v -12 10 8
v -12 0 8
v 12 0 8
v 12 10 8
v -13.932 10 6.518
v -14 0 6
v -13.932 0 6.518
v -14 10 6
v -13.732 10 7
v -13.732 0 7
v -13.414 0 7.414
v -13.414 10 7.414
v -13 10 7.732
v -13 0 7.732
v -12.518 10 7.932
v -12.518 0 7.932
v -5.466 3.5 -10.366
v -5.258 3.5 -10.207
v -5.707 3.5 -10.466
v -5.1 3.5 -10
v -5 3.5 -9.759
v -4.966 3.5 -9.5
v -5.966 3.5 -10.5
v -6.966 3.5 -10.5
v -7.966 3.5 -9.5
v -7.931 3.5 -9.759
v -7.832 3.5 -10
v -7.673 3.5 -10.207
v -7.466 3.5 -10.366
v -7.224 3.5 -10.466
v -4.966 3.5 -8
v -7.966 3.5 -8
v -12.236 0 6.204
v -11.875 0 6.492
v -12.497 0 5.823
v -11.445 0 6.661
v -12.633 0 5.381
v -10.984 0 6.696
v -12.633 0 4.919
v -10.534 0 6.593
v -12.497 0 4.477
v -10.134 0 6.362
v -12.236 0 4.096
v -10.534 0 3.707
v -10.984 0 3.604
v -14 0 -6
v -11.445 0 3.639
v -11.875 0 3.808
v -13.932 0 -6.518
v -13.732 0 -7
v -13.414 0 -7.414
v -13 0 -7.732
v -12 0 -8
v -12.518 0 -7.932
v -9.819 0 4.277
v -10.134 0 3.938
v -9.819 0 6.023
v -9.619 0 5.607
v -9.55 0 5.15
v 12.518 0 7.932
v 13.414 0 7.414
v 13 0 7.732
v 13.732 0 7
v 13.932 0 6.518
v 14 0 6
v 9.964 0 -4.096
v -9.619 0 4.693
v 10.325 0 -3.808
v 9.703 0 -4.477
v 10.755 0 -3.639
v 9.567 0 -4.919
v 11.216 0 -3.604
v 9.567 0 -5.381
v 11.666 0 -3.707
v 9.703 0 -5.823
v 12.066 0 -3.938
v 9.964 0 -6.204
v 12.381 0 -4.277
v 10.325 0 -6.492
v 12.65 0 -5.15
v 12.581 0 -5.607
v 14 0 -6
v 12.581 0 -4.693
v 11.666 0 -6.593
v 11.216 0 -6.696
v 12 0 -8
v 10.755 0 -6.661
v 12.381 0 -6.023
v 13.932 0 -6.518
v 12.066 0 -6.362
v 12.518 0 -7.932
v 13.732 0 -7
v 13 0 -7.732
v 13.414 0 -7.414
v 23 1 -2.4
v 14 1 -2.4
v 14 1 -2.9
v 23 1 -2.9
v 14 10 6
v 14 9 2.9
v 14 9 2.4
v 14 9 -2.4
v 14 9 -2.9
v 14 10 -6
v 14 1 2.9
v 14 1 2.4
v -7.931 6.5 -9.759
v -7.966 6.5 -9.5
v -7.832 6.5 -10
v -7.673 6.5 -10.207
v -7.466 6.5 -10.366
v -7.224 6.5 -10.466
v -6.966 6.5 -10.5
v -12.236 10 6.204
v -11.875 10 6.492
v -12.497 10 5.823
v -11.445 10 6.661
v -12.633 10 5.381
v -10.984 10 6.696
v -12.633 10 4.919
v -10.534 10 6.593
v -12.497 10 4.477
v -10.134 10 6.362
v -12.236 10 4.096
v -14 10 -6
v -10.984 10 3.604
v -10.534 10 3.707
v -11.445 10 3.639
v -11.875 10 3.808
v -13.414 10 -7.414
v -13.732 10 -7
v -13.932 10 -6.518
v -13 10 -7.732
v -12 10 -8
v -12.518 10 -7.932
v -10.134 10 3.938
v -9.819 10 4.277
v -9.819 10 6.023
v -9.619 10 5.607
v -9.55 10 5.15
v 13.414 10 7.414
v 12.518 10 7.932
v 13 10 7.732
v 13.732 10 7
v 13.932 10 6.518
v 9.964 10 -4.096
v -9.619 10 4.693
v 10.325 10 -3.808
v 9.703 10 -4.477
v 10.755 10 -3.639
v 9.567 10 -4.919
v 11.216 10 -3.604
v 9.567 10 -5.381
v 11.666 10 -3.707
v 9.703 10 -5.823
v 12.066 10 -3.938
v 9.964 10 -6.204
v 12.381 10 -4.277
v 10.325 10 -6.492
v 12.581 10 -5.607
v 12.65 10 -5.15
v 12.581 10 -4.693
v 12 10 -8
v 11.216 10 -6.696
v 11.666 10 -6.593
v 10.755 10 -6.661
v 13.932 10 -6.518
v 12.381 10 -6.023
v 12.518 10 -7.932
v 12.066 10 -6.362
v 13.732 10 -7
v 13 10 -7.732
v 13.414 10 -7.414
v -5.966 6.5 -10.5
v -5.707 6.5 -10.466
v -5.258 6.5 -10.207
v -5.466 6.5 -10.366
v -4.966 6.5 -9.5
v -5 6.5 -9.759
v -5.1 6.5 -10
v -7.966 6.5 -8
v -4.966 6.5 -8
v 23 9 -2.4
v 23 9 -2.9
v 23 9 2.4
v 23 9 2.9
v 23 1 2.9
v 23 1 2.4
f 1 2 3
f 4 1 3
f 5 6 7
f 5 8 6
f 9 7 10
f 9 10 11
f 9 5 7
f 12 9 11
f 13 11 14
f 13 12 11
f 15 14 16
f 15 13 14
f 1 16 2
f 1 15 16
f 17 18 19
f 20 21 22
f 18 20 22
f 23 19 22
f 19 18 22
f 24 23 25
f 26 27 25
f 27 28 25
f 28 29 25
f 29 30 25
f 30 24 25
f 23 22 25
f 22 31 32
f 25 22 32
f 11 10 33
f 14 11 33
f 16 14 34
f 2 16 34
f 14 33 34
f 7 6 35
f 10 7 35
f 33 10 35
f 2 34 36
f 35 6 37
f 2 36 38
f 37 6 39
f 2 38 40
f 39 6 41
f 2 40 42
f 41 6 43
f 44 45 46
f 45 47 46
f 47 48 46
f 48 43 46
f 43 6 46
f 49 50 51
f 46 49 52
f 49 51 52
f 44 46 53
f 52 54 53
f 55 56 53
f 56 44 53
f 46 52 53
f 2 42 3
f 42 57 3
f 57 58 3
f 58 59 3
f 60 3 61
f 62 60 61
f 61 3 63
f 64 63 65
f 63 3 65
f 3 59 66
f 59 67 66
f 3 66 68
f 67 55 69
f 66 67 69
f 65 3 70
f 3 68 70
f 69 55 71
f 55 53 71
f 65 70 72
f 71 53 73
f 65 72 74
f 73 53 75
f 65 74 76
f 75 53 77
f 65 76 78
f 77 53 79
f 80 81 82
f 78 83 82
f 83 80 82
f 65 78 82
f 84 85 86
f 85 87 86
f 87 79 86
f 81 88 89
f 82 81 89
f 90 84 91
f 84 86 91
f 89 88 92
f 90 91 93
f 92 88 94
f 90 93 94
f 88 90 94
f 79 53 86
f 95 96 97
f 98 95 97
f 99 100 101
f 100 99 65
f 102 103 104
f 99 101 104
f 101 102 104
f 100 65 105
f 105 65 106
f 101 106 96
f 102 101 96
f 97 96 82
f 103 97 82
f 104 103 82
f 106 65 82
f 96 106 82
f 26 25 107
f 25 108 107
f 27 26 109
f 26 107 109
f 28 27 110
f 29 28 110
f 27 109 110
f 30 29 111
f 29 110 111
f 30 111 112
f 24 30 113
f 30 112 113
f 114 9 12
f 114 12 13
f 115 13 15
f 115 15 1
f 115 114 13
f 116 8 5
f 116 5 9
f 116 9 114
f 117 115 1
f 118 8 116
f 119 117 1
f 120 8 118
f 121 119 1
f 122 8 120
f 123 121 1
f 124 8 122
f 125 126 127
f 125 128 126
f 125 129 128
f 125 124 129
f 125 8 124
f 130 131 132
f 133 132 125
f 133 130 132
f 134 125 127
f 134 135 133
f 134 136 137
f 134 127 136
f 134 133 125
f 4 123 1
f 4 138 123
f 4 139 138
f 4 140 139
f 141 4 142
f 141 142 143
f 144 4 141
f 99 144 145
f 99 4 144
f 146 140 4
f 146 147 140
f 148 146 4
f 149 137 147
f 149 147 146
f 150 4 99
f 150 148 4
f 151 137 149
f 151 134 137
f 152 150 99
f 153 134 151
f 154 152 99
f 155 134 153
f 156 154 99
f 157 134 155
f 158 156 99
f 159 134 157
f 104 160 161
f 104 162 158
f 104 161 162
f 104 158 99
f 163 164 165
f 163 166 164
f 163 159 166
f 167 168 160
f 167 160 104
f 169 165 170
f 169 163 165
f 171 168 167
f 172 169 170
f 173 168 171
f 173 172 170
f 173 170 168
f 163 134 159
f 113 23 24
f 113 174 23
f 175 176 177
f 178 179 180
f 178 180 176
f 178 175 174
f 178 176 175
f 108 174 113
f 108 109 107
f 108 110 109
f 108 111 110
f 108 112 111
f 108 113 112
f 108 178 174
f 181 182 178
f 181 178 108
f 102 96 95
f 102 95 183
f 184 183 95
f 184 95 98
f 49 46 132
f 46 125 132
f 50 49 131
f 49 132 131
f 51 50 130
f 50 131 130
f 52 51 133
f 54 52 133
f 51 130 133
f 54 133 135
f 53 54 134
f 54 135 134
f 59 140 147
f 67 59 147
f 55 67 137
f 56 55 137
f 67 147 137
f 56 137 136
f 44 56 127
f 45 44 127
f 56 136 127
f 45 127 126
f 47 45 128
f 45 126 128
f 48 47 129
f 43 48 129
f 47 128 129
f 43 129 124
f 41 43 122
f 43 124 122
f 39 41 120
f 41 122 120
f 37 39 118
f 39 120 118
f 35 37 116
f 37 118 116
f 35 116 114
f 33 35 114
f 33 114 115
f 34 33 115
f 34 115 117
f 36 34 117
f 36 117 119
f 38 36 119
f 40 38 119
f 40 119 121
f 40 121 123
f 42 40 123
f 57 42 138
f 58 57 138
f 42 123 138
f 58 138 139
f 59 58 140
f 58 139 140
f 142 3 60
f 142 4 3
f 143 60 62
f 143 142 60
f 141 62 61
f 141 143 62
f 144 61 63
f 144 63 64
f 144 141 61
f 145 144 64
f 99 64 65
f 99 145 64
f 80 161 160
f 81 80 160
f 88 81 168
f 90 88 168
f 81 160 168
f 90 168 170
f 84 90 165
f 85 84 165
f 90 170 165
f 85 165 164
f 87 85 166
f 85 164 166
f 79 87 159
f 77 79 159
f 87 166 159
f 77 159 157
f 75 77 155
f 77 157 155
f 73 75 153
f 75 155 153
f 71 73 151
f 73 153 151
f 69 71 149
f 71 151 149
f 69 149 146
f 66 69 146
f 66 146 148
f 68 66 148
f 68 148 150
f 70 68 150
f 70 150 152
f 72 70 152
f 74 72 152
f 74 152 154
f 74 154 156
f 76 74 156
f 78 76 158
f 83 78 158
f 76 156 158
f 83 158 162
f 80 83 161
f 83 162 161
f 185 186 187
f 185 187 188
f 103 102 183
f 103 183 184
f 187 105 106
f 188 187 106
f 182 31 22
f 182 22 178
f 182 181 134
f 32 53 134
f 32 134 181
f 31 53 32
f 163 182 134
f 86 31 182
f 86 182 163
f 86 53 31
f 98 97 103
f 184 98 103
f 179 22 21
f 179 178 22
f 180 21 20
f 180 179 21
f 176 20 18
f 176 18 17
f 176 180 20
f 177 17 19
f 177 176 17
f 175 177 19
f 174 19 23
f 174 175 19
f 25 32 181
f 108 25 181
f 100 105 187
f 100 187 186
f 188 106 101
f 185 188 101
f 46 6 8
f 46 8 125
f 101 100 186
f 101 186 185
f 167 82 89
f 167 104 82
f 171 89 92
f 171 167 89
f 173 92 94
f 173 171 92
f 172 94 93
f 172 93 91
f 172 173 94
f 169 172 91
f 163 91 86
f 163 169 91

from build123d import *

# Parameters (mm, degrees)
SKETCH_1_W          = 28
SKETCH_1_H          = 16
EXTRUDE_1_DEPTH     = 10
FILLET_1_R          = 2
SKETCH_2_R          = 1.55
CUT_EXTRUDE_1_DEPTH = 10
SKETCH_3_W          = 0.5
SKETCH_3_H          = 8
EXTRUDE_2_DEPTH     = 9
SKETCH_4_W          = 3
SKETCH_4_H          = 3
EXTRUDE_3_DEPTH     = 2.5
FILLET_2_R          = 1


with BuildPart() as part:
    # 스케치1 → 보스-돌출1 (new body)
    with BuildSketch(Plane(origin=(0, 0, 0), x_dir=(1, 0, 0), z_dir=(0, 1, 0))):
        Rectangle(SKETCH_1_W, SKETCH_1_H)
    extrude(amount=EXTRUDE_1_DEPTH)

    # 필렛1
    fillet_1_edges = [part.edges().sort_by_distance(p)[0] for p in [
        (-14, 5, -8),
        (14, 5, -8),
        (14, 5, 8),
        (-14, 5, 8),
    ]]
    fillet(fillet_1_edges, radius=FILLET_1_R)

    # 스케치2 → 컷-돌출1 (cut)
    with BuildSketch(Plane(origin=(0, 10, 0), x_dir=(1, 0, 0), z_dir=(0, 1, 0))):
        with Locations((11.1, 5.15)):
            Circle(SKETCH_2_R)
        with Locations((-11.1, -5.15)):
            Circle(SKETCH_2_R)
    extrude(amount=-CUT_EXTRUDE_1_DEPTH, mode=Mode.SUBTRACT)

    # 스케치3 → 보스-돌출2 (add)
    with BuildSketch(Plane(origin=(14, 0, 0), x_dir=(0, 0, -1), z_dir=(1, 0, 0))):
        with Locations((-2.65, 5)):
            Rectangle(SKETCH_3_W, SKETCH_3_H)
        with Locations((2.65, 5)):
            Rectangle(SKETCH_3_W, SKETCH_3_H)
    extrude(amount=EXTRUDE_2_DEPTH)

    # 스케치4 → 보스-돌출3 (add)
    with BuildSketch(Plane(origin=(0, 0, -8), x_dir=(-1, 0, 0), z_dir=(0, 0, -1))):
        with Locations((6.465564218, 5)):
            Rectangle(SKETCH_4_W, SKETCH_4_H)
    extrude(amount=EXTRUDE_3_DEPTH)

    # 필렛2
    fillet_2_edges = [part.edges().sort_by_distance(p)[0] for p in [
        (-4.965564218, 5, -10.5),
        (-7.965564218, 5, -10.5),
    ]]
    fillet(fillet_2_edges, radius=FILLET_2_R)


solid = part.part
